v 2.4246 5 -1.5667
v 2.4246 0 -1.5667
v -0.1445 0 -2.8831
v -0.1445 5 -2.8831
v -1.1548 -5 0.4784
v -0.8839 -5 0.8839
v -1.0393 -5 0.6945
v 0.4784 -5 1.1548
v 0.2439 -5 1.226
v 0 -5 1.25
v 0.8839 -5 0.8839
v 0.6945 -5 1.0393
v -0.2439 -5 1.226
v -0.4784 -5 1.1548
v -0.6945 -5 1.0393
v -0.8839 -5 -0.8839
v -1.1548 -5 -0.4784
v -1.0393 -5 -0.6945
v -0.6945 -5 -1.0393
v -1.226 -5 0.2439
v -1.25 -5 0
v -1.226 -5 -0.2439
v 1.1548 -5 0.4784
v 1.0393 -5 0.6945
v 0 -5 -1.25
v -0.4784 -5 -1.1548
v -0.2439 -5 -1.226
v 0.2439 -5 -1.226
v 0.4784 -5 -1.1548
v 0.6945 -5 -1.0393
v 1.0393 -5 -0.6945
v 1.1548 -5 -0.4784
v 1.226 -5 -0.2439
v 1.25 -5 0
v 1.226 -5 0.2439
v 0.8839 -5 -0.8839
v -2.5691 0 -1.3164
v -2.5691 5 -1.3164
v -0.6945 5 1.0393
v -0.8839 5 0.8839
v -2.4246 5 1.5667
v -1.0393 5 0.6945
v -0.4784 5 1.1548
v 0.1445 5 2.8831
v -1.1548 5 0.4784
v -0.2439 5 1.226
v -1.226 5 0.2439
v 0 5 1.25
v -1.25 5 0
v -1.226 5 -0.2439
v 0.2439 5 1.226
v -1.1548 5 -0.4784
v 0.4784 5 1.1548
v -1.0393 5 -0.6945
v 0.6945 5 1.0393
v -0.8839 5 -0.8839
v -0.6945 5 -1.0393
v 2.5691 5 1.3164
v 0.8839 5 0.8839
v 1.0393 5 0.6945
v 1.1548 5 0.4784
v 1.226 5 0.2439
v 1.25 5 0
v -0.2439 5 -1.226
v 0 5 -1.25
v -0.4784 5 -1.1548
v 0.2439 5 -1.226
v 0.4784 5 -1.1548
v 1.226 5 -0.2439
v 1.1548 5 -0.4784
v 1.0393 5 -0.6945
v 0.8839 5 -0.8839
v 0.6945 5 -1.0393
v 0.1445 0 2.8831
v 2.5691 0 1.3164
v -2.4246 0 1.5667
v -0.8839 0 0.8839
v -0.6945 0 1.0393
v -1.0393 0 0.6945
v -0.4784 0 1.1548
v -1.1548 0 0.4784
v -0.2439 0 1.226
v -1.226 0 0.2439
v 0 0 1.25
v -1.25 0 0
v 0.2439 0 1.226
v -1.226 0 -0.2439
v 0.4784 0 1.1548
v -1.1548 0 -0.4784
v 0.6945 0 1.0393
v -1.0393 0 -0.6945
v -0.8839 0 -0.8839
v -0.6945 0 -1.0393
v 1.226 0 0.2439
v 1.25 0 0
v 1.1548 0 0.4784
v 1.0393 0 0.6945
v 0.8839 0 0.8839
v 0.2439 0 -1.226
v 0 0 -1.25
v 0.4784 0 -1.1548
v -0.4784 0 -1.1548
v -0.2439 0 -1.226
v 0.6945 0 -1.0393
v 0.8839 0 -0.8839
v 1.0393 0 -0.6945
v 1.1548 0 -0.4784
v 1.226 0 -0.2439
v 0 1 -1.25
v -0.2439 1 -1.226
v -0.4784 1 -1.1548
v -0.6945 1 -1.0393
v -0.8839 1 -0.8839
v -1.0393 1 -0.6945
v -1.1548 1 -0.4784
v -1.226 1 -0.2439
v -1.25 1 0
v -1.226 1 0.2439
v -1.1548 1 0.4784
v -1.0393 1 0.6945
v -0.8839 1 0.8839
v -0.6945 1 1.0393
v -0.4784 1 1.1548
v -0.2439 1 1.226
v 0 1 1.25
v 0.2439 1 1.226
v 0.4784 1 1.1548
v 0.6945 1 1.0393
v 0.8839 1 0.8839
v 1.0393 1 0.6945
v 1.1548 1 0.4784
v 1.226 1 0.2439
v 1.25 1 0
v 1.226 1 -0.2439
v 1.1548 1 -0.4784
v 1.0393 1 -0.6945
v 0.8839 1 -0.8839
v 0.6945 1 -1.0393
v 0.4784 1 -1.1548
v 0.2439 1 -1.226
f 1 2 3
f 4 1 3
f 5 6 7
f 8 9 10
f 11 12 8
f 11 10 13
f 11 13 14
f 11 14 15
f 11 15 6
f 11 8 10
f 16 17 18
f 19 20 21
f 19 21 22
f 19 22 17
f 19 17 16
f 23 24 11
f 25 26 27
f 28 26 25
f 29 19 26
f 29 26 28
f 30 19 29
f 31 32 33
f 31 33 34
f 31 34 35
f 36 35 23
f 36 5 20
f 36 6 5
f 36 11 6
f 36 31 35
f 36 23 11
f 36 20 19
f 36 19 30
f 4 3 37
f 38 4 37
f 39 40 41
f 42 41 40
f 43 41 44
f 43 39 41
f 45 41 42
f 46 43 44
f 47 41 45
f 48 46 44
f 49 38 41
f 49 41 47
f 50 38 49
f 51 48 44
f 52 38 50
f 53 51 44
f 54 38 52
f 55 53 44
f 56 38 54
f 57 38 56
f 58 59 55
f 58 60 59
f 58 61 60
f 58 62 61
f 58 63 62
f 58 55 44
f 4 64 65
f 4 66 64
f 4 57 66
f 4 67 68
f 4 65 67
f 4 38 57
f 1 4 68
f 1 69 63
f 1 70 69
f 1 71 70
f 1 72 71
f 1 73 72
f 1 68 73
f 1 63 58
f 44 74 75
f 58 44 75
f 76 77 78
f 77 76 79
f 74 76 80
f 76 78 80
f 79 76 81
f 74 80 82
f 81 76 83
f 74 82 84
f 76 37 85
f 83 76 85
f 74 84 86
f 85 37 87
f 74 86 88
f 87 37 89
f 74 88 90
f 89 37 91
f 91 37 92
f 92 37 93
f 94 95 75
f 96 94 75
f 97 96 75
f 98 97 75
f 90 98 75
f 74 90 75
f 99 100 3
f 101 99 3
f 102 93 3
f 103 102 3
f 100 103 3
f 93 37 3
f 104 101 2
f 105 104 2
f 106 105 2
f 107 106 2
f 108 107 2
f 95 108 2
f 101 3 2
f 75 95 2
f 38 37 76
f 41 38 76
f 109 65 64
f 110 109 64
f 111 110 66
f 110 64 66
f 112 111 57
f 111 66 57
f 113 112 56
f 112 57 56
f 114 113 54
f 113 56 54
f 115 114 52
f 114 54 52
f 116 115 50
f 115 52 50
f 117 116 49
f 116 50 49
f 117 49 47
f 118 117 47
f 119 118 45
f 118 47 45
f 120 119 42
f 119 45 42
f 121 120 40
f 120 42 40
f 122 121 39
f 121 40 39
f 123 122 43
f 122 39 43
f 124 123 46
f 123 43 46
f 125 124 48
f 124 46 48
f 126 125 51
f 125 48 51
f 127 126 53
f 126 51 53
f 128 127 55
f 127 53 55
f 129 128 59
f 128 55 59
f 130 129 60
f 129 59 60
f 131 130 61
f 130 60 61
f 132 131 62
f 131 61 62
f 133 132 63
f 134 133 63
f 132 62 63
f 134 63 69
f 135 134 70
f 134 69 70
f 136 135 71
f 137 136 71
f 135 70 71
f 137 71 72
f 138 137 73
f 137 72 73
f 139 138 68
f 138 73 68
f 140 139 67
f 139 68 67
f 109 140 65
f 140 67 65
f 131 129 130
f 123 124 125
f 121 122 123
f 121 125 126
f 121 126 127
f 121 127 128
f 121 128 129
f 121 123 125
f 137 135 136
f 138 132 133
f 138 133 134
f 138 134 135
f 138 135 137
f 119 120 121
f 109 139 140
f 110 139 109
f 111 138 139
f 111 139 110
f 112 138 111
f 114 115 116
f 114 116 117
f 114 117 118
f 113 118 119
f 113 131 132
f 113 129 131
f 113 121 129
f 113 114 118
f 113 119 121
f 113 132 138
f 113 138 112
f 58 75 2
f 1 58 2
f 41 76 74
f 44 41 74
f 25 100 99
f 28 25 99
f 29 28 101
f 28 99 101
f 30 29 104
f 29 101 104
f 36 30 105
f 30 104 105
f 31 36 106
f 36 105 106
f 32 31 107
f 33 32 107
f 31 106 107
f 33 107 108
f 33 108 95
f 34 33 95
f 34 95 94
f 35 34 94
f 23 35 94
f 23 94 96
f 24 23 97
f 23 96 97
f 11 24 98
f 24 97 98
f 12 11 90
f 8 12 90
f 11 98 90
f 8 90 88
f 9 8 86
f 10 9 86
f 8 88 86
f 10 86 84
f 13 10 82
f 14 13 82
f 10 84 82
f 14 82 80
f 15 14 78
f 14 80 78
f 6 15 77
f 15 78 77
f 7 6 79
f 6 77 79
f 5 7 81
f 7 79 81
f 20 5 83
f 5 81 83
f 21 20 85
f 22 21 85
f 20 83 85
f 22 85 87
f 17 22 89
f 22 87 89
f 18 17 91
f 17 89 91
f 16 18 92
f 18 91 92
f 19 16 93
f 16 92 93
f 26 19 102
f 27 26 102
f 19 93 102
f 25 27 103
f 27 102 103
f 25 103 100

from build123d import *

# Parameters (mm, degrees)
EXTRUSION1_DEPTH        = 5
ESQUISSE2_R             = 1.25
EXTRUSION2_DEPTH        = 5
ESQUISSE3_R             = 1.25
ENL_V_MAT_EXTRU_2_DEPTH = 4


with BuildPart() as part:
    # Esquisse1 → Extrusion1 (new body)
    with BuildSketch(Plane(origin=(0, 0, 0), x_dir=(1, 0, 0), z_dir=(0, 1, 0))):
        Polygon((2.424630573, 1.56668437), (-0.144473178, 2.883133856), (-2.569103751, 1.316449486), (-2.424630573, -1.56668437), (0.144473178, -2.883133856), (2.569103751, -1.316449486), align=None)
    extrude(amount=EXTRUSION1_DEPTH)

    # Esquisse2 → Extrusion2 (add)
    with BuildSketch(Plane.XZ):
        with Locations(Location((0, 0, 0), (0, 0, 270))):  # turned: the seam where the file's is
            Circle(ESQUISSE2_R)
    extrude(amount=EXTRUSION2_DEPTH)

    # Esquisse3 → Enlèv. mat.-Extru.2 (cut)
    with BuildSketch(Plane(origin=(0, 5, 0), x_dir=(-1, 0, 0), z_dir=(0, 1, 0))):
        with Locations(Location((0, 0, 0), (0, 0, 270))):  # turned: the seam where the file's is
            Circle(ESQUISSE3_R)
    extrude(amount=-ENL_V_MAT_EXTRU_2_DEPTH, mode=Mode.SUBTRACT)


solid = part.part
